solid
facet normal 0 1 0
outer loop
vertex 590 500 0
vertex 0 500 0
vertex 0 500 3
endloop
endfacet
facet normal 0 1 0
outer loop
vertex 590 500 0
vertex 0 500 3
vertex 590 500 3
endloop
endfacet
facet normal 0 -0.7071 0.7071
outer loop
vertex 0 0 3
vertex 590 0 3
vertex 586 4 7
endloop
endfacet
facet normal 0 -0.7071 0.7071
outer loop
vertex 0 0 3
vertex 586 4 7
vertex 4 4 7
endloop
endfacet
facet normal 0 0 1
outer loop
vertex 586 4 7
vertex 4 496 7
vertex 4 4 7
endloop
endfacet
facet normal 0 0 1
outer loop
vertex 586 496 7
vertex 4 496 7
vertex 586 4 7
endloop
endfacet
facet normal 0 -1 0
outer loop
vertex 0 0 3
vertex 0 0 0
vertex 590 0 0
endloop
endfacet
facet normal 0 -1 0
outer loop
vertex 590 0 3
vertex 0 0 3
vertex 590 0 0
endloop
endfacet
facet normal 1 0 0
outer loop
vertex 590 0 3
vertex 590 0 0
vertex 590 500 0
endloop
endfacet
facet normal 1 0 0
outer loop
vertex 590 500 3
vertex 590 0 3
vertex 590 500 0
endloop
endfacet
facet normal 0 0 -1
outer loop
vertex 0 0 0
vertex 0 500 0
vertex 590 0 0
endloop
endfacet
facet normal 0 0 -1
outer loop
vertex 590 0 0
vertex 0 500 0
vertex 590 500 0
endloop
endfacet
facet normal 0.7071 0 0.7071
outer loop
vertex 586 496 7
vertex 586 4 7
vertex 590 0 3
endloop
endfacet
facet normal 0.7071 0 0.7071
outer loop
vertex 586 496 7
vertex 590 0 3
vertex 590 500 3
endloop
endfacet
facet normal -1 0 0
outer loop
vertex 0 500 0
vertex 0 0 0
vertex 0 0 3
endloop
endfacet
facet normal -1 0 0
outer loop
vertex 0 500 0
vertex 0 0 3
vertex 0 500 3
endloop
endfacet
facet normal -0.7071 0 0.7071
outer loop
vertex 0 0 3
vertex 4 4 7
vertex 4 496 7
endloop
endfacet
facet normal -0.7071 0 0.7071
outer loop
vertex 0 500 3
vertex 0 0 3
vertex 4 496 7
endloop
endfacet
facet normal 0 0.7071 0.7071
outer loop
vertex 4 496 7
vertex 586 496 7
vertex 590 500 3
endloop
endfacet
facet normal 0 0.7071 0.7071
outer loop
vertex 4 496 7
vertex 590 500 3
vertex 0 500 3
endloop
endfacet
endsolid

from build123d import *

# Parameters (mm, degrees)
F0_W     = 44.8449254036
F0_H     = 43.0354773998
F1_DEPTH = 7
F2_DEPTH = 590
F3_DEPTH = 500
F4_SIZE  = 4


with BuildPart() as f1:
    # F0 (on Top) → F1 (new body)
    with BuildSketch(Plane.XY):
        with Locations((22.4224627018, 21.5177386999)):
            Rectangle(F0_W, F0_H)
    extrude(amount=F1_DEPTH)

    # F2 (add): a face of the model
    f2_faces = [f1.faces().sort_by_distance(p)[0] for p in [
        (0, 21.5177386999, 3.5),
    ]]
    extrude(f2_faces, amount=-F2_DEPTH)

    # F3 (add): a face of the model
    f3_faces = [f1.faces().sort_by_distance(p)[0] for p in [
        (295, 0, 3.5),
    ]]
    extrude(f3_faces, amount=-F3_DEPTH)

    # F4
    f4_edges = [f1.edges().sort_by_distance(p)[0] for p in [
        (0, 250, 7),
        (295, 0, 7),
        (590, 250, 7),
        (295, 500, 7),
    ]]
    chamfer(f4_edges, length=F4_SIZE)


solid = f1.part
